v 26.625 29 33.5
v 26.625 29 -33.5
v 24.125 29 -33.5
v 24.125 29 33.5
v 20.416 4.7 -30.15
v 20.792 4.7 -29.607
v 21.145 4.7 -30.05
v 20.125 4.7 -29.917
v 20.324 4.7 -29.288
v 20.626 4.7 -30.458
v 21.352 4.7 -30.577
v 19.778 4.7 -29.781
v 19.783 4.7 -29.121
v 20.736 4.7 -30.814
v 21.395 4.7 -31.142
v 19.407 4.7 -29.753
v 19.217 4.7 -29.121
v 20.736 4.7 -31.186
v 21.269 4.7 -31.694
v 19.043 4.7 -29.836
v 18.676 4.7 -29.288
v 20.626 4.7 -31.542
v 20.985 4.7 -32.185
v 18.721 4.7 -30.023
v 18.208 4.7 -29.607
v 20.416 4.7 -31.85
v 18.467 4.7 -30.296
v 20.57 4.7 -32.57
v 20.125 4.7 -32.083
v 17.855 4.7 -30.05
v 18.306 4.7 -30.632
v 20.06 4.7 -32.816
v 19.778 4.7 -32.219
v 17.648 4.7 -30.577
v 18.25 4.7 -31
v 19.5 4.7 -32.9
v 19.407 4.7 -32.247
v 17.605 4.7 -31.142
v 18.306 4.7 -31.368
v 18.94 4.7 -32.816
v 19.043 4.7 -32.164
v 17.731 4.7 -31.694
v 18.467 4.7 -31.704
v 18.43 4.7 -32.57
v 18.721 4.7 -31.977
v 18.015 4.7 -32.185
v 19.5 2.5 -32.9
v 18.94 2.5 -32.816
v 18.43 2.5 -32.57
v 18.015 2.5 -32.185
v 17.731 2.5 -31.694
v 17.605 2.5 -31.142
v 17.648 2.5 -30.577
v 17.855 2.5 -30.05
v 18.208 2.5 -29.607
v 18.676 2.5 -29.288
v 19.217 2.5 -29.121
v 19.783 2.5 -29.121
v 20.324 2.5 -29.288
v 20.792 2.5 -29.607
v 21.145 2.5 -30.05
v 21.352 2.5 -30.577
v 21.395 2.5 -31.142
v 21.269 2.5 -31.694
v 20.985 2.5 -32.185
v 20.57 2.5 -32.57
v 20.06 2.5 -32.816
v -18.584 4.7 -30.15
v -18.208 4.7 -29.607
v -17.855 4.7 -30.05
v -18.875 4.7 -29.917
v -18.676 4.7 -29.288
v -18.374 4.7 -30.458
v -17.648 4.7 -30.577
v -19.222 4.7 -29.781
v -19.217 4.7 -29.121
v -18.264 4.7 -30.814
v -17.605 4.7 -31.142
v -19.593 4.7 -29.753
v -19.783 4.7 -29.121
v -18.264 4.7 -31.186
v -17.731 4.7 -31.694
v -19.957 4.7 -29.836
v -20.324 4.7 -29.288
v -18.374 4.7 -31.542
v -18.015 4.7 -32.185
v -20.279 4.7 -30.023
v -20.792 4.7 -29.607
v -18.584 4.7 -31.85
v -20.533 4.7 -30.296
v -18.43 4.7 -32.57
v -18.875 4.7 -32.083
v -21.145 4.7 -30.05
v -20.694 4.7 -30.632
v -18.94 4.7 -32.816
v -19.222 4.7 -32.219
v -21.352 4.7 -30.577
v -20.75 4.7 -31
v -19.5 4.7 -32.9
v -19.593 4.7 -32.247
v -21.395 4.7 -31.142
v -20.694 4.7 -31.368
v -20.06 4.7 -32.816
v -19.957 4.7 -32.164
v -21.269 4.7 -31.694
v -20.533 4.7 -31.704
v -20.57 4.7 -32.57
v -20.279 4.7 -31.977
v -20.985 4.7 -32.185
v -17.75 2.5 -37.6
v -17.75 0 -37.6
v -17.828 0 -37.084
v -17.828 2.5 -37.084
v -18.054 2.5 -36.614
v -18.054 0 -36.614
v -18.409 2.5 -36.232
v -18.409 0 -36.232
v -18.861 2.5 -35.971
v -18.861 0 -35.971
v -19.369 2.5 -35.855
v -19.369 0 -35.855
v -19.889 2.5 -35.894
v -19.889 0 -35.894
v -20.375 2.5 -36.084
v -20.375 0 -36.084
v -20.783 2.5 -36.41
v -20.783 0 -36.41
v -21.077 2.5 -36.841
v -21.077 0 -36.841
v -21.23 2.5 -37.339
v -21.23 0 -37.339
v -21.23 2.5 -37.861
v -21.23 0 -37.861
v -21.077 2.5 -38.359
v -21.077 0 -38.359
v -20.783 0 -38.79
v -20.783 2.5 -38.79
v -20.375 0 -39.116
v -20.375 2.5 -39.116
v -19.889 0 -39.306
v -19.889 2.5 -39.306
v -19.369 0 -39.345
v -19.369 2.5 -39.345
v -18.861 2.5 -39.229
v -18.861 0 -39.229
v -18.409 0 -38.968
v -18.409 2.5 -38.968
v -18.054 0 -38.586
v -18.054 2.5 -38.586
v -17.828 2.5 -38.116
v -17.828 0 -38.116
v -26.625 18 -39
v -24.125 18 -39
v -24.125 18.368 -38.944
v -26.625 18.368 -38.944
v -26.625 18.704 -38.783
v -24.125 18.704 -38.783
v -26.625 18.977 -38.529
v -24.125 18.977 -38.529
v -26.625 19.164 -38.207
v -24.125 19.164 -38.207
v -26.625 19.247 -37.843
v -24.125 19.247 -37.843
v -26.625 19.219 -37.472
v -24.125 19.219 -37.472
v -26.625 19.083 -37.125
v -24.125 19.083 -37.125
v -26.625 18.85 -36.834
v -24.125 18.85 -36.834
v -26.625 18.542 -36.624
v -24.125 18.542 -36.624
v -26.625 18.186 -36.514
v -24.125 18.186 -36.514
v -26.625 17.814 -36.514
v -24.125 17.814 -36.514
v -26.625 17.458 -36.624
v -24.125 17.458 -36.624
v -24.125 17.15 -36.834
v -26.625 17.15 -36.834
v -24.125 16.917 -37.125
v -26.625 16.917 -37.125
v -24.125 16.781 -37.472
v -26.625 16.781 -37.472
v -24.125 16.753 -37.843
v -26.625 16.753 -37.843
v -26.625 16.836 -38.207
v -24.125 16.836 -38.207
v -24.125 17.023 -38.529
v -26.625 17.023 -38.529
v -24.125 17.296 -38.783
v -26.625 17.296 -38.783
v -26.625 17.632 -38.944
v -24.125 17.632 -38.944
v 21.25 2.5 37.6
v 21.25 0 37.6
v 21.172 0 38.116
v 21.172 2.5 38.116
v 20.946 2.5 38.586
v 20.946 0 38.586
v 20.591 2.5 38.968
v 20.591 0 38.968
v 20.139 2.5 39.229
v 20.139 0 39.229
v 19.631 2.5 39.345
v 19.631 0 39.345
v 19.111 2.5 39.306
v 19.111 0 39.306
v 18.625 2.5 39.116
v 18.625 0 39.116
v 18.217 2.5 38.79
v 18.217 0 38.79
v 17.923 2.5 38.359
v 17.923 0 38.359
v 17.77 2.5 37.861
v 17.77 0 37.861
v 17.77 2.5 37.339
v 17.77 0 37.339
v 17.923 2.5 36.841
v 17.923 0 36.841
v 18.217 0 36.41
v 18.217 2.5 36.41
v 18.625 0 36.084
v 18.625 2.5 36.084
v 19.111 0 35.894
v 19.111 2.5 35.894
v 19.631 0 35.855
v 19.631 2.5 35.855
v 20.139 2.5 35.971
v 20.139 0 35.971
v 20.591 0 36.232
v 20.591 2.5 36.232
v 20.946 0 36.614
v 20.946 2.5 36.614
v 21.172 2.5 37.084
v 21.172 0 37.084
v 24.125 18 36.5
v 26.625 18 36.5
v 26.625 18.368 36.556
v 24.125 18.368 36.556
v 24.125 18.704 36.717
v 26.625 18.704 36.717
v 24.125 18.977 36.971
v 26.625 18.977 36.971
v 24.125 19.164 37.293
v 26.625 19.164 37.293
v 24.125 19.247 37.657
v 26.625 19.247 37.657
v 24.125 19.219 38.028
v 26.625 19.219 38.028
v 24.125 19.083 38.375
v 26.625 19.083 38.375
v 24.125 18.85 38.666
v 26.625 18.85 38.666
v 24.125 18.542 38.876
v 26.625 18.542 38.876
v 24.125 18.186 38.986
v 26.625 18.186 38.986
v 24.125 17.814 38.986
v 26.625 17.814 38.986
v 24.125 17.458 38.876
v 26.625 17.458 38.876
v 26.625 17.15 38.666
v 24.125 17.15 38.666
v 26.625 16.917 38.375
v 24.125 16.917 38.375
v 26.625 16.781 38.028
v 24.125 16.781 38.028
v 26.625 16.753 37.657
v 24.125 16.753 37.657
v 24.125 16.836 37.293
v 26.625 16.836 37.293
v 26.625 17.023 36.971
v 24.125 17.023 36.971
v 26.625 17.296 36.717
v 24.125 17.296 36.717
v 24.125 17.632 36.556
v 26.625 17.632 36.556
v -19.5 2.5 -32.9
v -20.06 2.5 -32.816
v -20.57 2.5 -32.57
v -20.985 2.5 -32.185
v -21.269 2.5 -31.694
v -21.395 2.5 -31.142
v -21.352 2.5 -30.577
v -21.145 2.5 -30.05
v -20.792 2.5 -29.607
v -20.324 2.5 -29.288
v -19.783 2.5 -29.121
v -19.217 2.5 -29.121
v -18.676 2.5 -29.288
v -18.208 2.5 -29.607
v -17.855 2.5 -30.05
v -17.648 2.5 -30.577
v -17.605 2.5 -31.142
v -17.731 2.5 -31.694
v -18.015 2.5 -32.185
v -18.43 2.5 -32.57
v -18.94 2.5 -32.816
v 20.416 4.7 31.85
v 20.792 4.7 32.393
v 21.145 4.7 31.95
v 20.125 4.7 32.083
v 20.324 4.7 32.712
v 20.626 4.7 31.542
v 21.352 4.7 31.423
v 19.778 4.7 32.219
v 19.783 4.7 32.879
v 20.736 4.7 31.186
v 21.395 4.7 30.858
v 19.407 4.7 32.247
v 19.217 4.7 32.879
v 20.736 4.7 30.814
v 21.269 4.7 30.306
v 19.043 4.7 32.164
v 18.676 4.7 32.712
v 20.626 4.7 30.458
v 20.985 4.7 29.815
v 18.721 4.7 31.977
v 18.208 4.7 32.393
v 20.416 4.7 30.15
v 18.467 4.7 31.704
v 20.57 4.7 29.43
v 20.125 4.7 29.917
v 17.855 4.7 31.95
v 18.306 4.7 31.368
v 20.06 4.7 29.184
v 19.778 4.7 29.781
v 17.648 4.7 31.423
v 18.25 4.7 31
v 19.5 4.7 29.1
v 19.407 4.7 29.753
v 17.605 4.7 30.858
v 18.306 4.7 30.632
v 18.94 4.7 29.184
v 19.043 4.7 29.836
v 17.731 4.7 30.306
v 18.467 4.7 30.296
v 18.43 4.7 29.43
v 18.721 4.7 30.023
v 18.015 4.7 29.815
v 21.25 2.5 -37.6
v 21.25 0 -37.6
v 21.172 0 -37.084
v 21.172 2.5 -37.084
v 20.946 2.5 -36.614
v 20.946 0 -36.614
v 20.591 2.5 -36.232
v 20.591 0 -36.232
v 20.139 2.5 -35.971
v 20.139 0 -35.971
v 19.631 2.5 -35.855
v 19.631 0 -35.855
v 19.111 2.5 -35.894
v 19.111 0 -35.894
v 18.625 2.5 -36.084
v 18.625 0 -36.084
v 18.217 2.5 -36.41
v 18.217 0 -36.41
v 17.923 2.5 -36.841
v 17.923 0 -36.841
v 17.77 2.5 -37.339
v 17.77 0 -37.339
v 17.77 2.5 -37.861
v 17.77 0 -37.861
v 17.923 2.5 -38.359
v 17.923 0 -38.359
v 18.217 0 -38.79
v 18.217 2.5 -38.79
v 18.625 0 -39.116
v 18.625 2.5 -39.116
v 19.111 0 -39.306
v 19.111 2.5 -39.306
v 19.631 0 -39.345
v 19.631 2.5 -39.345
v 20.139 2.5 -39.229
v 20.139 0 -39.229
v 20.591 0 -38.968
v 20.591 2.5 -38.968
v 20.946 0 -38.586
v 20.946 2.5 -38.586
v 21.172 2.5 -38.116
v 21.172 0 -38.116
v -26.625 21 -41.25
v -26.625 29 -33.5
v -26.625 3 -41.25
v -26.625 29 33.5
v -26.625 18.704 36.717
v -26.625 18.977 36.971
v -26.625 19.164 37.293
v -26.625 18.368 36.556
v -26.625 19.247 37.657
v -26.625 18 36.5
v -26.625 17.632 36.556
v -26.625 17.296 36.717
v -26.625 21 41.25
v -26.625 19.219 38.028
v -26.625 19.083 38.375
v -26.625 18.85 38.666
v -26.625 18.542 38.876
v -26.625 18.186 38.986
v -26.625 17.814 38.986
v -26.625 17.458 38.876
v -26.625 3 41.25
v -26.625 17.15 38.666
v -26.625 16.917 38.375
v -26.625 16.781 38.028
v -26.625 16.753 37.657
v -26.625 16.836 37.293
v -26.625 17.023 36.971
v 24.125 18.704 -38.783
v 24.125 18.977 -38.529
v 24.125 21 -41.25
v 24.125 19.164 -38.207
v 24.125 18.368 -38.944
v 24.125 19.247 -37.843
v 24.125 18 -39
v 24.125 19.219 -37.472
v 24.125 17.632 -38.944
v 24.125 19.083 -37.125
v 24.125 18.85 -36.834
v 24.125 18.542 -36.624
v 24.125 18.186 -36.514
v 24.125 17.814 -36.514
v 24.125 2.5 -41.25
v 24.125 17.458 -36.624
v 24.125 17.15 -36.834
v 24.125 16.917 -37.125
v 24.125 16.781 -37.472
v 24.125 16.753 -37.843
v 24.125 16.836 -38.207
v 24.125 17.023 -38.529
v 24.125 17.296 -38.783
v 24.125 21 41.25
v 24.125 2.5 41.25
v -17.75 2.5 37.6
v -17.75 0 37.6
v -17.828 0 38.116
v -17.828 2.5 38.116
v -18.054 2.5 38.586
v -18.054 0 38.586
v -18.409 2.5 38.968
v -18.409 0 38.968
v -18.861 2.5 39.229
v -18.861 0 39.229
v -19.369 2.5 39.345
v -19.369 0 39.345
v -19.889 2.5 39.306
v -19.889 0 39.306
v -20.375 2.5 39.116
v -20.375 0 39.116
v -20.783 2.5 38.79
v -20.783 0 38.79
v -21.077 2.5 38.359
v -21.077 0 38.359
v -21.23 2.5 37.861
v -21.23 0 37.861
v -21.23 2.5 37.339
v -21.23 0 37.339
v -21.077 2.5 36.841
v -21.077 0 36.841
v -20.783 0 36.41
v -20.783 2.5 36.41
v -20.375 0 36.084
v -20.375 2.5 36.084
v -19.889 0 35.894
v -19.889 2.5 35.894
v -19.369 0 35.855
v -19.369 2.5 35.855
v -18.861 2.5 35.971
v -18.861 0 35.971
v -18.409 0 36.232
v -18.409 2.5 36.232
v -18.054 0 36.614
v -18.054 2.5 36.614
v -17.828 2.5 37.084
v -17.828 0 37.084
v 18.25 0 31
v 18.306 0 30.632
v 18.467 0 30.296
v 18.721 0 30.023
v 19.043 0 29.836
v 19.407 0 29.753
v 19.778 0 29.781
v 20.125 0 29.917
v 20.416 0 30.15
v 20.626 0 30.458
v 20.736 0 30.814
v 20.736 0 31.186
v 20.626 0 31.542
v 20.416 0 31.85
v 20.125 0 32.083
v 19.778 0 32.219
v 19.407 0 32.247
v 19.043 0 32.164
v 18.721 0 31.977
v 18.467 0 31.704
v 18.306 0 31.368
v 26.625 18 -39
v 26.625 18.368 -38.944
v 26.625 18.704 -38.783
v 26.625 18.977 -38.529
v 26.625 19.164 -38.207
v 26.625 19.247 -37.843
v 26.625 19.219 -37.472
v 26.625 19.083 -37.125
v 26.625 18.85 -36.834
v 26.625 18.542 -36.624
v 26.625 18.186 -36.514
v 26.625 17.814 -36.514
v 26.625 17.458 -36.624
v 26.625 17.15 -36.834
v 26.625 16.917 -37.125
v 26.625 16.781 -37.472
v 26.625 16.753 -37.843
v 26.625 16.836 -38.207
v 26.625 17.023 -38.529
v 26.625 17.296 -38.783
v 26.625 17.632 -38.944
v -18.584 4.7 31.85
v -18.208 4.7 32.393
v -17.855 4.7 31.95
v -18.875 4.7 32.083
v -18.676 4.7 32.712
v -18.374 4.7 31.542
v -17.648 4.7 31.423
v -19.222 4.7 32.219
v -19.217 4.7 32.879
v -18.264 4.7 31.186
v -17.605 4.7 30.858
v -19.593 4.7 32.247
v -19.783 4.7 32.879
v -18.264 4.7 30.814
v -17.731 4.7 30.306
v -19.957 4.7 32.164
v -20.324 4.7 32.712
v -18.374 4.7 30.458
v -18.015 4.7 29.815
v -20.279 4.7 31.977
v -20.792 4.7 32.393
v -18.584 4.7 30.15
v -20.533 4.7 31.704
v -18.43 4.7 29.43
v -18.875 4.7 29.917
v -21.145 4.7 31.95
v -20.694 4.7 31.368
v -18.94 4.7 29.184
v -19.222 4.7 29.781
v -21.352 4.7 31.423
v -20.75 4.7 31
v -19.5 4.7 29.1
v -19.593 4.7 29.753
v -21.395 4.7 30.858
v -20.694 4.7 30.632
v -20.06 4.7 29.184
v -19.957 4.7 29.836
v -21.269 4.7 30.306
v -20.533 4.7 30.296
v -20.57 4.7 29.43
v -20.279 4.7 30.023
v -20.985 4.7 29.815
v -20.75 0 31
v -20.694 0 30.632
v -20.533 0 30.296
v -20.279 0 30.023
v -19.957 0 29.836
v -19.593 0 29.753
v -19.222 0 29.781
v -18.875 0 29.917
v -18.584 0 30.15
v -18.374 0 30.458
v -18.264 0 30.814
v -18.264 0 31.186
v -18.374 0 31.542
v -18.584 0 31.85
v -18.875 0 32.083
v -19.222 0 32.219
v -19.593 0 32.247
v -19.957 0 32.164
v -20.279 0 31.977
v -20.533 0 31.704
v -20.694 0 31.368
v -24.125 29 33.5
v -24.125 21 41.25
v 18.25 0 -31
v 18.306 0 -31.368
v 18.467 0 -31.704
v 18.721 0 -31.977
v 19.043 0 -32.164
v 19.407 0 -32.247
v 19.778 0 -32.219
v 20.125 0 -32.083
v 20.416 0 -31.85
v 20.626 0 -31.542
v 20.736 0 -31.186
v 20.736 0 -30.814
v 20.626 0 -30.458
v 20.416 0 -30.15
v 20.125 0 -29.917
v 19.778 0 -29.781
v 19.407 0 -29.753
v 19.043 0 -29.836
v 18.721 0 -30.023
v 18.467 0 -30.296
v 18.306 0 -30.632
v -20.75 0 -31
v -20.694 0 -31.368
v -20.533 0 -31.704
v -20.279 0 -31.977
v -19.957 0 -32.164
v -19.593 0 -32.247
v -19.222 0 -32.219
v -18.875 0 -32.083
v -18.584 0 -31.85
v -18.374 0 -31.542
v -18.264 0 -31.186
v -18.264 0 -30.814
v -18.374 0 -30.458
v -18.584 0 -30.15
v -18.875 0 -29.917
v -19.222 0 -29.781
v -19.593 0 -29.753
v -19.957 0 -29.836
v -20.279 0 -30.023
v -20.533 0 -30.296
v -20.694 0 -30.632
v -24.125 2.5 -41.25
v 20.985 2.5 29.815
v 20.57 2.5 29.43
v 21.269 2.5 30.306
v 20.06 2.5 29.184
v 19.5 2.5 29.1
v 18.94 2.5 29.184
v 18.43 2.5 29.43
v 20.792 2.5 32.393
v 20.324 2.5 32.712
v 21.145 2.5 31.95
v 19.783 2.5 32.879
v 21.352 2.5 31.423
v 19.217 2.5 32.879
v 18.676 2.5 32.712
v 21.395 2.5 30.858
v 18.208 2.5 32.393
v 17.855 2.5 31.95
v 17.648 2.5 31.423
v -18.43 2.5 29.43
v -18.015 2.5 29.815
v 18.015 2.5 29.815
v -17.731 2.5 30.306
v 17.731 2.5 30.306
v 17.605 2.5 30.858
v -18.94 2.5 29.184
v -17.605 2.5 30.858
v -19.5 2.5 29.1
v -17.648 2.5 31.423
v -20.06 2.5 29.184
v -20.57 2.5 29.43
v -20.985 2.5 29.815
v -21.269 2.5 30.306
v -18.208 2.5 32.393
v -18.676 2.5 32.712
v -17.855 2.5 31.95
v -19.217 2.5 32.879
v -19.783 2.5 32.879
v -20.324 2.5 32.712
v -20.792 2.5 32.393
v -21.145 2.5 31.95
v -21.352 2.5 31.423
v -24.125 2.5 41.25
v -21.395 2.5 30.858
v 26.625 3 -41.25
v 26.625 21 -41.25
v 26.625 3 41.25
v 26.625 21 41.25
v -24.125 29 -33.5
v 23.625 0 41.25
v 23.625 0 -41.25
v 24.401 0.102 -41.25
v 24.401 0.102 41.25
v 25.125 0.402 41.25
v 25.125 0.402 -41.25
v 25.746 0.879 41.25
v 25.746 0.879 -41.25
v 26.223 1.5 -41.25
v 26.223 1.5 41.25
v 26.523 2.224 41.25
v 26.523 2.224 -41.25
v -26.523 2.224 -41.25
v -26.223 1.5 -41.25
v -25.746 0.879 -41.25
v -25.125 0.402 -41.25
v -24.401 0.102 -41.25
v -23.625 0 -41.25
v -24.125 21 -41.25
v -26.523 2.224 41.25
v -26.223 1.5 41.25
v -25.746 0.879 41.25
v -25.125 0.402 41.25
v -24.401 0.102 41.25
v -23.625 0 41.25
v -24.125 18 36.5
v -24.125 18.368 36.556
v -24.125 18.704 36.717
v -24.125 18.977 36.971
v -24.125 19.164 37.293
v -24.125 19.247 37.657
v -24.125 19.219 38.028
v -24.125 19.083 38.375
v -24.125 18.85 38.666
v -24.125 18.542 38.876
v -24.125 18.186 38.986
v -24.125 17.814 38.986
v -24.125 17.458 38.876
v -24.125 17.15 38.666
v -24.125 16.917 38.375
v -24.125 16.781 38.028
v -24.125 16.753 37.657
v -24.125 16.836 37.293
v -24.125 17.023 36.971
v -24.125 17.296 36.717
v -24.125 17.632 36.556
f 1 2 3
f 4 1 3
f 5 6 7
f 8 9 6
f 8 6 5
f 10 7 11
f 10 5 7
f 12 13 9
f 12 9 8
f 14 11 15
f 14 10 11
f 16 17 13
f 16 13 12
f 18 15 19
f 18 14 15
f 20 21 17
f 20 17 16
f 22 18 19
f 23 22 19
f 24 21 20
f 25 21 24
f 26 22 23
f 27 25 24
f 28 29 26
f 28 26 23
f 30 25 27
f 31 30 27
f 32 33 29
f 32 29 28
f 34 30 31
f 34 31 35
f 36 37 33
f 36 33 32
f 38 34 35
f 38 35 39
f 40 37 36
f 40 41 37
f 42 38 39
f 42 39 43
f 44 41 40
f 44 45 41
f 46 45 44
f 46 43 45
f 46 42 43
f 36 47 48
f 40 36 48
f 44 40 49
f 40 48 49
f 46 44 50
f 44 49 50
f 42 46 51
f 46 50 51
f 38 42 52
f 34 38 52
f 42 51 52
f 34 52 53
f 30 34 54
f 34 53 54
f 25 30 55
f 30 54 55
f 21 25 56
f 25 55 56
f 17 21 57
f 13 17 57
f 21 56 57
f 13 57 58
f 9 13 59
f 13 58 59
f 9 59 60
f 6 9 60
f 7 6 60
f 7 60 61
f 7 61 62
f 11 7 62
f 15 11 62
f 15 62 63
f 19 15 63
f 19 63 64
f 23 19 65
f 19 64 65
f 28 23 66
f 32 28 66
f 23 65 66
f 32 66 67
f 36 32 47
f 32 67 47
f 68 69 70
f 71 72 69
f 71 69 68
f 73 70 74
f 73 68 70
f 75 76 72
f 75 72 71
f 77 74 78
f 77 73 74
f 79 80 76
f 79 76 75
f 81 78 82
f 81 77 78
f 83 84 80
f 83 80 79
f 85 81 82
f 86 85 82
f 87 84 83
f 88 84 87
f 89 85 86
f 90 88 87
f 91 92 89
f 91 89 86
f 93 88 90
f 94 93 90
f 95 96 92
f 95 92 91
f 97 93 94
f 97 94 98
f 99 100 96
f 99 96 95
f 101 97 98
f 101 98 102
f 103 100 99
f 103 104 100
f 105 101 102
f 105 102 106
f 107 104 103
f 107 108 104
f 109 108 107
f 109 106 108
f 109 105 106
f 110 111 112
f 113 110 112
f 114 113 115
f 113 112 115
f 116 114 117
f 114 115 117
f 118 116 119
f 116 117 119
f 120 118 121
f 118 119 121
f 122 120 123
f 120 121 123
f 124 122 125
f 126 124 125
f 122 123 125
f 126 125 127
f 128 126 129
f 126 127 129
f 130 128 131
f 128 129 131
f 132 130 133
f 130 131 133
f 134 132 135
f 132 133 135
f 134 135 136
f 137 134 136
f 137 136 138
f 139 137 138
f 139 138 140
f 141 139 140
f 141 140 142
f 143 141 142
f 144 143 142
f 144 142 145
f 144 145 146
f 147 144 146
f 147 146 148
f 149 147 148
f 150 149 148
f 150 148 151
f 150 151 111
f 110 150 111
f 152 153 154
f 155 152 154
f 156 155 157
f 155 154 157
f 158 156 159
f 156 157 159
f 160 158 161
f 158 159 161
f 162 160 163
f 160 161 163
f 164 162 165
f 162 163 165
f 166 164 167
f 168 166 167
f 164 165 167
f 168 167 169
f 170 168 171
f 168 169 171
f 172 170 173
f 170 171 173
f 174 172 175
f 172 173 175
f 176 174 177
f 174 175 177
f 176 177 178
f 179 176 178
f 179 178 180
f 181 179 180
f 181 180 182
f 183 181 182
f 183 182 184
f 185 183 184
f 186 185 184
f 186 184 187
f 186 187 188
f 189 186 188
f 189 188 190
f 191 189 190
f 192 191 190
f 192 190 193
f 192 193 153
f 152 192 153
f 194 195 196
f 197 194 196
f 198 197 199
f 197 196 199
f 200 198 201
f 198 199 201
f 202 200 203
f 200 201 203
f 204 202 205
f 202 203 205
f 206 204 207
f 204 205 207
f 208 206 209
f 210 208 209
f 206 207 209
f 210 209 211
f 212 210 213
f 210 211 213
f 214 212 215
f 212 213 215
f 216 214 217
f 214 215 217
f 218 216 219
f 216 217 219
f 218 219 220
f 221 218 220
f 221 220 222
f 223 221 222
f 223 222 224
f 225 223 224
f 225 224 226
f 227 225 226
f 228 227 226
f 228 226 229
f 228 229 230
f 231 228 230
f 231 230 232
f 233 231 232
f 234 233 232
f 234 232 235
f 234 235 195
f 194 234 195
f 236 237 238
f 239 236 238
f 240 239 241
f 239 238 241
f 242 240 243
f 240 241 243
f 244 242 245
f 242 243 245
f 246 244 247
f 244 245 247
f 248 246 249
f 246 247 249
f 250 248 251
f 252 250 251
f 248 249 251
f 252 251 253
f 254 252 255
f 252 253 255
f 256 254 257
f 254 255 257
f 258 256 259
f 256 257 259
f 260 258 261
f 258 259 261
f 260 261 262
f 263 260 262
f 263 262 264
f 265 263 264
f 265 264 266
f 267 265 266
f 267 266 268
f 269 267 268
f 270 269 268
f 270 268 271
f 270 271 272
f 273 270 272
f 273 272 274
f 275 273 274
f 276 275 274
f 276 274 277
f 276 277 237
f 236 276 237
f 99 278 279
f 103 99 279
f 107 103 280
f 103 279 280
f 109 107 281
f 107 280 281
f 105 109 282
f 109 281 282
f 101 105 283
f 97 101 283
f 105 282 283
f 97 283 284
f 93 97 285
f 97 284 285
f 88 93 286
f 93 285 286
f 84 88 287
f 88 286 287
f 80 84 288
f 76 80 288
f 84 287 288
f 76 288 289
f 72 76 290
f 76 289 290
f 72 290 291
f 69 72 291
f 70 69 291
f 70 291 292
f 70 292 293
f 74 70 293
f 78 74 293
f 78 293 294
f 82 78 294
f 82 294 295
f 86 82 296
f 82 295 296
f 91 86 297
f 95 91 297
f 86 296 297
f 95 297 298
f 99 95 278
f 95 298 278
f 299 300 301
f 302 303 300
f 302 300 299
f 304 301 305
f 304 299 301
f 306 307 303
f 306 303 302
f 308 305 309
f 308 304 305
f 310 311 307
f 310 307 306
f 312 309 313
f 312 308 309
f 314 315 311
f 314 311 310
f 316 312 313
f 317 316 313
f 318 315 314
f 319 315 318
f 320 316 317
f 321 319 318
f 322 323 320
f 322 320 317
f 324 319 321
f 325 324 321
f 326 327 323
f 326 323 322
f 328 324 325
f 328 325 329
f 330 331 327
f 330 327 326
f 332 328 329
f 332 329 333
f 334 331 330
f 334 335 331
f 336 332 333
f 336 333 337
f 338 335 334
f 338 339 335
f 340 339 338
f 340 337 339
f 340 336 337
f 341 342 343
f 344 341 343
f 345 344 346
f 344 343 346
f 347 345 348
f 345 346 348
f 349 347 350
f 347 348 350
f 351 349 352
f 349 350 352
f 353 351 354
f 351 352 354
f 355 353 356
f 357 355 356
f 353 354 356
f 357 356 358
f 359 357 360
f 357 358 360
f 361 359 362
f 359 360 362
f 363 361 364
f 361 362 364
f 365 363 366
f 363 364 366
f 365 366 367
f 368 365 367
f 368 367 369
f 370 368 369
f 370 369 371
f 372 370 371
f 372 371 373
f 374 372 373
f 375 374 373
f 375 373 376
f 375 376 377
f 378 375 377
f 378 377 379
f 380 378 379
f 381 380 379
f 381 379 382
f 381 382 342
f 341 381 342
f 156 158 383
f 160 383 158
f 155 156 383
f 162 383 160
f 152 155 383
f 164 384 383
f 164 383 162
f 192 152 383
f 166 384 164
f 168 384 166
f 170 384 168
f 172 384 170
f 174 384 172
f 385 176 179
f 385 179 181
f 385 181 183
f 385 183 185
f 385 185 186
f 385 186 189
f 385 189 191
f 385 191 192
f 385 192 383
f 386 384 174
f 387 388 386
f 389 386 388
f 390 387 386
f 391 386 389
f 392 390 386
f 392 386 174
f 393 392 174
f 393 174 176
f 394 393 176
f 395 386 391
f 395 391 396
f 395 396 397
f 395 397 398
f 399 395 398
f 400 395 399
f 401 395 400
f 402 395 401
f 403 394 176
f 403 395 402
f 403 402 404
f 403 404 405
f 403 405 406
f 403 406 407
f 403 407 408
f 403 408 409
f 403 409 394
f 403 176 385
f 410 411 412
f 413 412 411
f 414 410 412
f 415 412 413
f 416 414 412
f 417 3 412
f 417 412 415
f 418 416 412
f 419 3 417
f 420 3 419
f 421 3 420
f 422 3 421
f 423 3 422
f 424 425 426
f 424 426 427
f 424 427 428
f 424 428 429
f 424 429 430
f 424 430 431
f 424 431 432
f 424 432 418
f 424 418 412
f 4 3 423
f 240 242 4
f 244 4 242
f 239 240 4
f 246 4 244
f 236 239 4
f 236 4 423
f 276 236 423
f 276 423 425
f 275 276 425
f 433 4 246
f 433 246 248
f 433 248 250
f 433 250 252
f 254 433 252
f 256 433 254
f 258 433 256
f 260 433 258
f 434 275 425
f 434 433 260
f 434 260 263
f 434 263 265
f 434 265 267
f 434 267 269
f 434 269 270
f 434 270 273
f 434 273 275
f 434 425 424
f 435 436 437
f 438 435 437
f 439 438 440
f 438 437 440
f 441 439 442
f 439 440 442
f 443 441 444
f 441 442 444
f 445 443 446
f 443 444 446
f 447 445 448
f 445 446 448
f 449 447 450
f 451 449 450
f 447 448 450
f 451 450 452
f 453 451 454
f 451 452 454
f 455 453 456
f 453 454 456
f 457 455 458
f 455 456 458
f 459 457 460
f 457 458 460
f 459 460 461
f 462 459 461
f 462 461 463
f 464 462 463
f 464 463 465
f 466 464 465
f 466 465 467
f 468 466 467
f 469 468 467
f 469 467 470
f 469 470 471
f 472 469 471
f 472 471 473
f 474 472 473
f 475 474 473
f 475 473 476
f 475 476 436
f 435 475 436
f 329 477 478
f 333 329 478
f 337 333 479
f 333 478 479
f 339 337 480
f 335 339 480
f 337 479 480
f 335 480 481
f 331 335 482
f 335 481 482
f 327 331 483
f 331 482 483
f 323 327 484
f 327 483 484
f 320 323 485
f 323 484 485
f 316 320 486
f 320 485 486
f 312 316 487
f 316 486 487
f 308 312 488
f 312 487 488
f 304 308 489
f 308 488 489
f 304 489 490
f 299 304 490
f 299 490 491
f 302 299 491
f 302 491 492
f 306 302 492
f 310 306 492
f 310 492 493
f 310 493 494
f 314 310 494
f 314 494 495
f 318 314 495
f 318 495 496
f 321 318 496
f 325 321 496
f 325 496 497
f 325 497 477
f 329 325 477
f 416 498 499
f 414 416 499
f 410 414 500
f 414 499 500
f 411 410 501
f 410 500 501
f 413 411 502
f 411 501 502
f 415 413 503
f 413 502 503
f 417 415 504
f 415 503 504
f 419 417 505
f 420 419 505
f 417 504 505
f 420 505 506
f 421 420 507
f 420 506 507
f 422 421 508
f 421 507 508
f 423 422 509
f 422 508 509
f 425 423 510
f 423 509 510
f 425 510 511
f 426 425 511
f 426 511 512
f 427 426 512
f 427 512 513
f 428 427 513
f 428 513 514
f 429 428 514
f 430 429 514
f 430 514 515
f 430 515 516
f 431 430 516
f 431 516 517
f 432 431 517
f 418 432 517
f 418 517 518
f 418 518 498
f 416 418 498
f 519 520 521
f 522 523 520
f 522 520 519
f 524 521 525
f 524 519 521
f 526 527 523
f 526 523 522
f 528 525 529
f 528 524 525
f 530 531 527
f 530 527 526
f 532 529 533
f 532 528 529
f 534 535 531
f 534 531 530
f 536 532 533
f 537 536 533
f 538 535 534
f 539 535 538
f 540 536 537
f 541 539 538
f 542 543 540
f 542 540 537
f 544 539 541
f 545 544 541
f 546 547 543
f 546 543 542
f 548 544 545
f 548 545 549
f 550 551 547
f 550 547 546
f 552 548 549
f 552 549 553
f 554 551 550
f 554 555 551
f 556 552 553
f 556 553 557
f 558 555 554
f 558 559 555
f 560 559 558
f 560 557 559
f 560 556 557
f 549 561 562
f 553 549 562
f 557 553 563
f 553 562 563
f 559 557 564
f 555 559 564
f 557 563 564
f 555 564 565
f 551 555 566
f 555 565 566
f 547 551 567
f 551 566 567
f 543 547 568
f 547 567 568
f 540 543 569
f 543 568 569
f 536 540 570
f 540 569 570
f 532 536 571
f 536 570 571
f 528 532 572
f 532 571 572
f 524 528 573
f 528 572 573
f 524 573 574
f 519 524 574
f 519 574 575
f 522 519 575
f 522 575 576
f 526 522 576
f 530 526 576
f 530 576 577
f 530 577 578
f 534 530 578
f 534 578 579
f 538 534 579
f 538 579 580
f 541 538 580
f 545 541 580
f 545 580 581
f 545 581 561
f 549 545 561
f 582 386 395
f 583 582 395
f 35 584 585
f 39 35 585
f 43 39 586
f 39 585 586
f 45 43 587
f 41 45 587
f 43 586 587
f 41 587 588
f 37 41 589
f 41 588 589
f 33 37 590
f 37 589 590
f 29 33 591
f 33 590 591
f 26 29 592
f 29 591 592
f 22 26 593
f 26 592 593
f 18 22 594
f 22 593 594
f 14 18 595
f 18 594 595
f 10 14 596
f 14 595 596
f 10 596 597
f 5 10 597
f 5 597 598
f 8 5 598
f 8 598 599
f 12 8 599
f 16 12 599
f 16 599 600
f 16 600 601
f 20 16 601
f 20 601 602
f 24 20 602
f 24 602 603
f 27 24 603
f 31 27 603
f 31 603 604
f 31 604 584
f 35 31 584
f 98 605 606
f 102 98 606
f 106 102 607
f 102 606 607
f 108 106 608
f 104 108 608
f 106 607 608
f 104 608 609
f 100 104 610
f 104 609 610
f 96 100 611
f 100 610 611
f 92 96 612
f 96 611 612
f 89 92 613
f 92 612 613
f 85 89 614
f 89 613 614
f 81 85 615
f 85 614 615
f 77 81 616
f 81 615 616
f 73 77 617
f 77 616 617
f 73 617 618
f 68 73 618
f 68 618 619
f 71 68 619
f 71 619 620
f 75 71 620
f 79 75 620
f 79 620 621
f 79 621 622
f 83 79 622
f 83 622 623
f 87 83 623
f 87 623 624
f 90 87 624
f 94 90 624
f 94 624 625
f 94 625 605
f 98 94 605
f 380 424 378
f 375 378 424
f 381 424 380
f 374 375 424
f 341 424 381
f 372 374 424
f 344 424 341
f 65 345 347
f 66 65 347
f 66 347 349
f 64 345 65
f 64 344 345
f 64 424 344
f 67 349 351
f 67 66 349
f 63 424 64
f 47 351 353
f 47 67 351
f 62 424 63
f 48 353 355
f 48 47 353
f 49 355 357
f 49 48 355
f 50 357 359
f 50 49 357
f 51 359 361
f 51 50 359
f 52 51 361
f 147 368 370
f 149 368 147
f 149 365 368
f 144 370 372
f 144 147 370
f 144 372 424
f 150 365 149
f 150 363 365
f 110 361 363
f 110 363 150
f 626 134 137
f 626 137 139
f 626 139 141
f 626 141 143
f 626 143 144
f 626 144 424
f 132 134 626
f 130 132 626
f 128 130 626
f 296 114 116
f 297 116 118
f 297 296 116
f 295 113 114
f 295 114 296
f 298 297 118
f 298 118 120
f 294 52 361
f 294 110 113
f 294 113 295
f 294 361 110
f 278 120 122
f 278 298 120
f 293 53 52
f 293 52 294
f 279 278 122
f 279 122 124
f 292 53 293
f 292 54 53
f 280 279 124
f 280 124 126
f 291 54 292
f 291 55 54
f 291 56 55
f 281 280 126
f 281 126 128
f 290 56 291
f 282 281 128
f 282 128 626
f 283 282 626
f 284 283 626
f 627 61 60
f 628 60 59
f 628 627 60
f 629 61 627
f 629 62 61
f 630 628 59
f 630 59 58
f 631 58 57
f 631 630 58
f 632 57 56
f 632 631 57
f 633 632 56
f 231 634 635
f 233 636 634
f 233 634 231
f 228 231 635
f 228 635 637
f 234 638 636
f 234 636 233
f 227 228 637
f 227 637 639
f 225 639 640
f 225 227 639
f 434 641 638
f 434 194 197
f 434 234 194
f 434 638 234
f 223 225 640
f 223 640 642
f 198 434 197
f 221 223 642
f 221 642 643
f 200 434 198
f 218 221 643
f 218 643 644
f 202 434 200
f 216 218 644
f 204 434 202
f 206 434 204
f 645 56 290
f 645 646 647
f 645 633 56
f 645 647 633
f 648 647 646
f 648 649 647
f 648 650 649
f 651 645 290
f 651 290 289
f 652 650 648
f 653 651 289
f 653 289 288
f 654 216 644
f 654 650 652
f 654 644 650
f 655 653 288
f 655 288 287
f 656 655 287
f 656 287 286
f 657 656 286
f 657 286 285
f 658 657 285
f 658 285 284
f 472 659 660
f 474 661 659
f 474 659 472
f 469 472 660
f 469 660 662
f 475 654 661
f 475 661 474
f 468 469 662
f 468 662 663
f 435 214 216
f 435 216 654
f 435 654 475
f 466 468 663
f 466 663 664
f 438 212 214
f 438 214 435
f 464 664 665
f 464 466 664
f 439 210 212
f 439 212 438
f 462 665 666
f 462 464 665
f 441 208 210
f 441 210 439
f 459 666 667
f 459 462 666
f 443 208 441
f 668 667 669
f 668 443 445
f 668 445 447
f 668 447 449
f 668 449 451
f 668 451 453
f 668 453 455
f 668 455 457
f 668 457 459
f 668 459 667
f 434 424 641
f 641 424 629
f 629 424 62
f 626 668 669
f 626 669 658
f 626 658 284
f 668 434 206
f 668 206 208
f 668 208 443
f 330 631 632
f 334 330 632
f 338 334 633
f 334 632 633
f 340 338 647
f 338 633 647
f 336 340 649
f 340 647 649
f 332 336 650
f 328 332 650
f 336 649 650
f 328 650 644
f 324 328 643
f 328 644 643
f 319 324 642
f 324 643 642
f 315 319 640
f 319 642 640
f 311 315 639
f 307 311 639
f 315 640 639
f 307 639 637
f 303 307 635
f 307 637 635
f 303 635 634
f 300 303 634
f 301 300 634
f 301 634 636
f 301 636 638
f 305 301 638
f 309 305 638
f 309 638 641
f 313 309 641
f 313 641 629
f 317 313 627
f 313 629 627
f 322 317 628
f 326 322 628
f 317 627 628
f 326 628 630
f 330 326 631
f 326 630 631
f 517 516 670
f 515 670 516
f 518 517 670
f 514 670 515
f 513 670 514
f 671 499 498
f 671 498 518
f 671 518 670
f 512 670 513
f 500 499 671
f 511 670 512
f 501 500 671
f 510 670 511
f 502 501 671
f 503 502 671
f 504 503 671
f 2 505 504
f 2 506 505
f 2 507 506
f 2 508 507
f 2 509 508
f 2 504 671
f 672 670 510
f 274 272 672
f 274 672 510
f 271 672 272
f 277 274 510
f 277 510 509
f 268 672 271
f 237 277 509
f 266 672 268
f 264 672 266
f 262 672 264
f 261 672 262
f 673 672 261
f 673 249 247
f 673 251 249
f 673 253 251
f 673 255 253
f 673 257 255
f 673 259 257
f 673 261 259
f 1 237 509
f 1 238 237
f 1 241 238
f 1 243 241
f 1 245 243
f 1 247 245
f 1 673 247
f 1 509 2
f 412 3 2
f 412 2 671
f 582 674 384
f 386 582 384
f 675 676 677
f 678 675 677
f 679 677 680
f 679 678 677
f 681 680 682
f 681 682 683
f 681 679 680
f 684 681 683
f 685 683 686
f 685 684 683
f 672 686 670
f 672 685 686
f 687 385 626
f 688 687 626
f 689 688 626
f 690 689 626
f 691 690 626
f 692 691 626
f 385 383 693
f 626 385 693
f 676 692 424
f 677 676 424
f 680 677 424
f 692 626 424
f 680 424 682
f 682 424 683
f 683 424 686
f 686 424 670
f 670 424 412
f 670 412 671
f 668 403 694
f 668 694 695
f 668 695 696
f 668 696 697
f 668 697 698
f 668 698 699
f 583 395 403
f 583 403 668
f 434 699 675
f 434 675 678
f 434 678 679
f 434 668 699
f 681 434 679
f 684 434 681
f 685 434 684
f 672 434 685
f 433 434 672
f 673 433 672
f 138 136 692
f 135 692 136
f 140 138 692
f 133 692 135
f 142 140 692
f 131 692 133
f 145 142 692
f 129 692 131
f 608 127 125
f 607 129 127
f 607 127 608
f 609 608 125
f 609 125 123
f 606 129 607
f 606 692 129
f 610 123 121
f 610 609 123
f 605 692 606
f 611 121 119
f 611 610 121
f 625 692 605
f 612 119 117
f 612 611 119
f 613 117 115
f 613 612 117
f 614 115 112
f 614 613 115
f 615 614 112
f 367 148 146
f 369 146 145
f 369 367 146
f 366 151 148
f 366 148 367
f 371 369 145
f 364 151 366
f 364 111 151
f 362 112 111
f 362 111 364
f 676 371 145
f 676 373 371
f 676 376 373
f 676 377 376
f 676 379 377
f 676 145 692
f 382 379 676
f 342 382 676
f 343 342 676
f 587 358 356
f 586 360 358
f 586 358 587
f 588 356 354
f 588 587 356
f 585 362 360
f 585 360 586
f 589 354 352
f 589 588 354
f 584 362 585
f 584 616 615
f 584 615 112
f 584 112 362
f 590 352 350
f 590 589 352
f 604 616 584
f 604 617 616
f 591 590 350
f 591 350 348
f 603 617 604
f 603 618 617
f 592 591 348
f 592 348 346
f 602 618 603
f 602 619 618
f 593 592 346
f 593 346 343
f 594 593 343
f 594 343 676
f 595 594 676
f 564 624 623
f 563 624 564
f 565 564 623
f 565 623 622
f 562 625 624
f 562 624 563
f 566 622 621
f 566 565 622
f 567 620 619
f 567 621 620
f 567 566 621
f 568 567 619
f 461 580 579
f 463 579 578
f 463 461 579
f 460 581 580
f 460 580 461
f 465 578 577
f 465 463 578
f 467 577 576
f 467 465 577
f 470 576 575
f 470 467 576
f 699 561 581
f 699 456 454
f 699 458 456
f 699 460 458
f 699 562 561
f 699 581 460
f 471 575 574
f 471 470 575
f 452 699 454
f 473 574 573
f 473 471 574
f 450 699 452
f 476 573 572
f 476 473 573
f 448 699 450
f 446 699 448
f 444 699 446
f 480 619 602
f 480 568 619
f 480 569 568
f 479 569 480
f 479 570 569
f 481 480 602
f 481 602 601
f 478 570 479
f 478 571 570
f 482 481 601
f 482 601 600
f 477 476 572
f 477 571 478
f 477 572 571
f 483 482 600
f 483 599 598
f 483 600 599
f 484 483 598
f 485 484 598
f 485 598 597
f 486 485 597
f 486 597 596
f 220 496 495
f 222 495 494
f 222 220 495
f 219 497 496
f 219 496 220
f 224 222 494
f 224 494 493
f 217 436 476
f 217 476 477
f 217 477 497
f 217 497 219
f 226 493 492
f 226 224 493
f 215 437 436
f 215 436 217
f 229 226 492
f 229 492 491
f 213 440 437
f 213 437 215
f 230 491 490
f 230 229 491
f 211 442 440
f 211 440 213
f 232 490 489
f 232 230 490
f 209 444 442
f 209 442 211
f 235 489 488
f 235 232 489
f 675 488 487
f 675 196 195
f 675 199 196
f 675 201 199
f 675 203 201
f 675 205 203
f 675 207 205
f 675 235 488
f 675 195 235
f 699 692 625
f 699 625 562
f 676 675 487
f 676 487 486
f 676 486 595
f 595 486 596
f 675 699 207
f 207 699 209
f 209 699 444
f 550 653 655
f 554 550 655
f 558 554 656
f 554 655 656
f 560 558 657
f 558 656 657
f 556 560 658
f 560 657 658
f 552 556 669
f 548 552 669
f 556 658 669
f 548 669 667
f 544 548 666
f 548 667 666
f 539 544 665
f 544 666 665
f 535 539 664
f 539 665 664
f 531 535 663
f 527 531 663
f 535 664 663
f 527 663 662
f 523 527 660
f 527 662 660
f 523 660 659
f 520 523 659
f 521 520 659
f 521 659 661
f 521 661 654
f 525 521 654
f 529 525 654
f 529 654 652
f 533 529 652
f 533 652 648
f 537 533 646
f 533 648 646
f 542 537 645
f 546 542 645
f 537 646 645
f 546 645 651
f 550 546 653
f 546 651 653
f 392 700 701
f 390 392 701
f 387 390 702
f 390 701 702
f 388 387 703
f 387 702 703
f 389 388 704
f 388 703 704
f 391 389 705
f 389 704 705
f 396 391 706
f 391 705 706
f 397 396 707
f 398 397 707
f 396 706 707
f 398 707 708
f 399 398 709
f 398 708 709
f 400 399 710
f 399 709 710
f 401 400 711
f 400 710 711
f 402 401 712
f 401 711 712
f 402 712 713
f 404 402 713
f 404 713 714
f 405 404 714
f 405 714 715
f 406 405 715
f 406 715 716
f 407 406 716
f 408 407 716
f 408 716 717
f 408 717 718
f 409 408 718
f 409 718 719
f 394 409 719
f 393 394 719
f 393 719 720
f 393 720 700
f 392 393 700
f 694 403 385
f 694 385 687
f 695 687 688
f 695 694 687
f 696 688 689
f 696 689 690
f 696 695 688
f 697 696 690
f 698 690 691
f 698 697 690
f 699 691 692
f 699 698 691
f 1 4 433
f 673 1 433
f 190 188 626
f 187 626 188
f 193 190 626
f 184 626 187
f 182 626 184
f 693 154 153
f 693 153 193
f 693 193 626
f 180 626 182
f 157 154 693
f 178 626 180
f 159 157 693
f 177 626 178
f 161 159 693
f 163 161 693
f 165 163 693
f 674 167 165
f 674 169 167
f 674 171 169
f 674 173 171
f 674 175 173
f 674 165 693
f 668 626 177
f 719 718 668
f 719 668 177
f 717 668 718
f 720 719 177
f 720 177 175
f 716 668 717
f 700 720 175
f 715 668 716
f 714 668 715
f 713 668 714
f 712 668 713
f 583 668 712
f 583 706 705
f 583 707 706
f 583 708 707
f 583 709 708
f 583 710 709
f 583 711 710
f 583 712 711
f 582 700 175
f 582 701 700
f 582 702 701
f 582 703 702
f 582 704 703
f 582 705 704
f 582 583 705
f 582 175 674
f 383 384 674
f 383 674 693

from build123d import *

# Parameters (mm, degrees)
EXTRUDE_1_DEPTH          = 41.25
CUT_EXTRUDE_1_DEPTH      = 58.02151458
CUT_EXTRUDE_1_DEPTH_BACK = 58.02151458
SKETCH_4_R               = 1.75
CUT_EXTRUDE_2_DEPTH      = 10
HOLE_WIZARD_M31_REACH    = 75.336
HOLE_WIZARD_M31_BORE_R   = 1.25
HOLE_WIZARD_M32_D        = 2.5
SKETCH_10_R              = 1.9
EXTRUDE_2_DEPTH          = 2.2
HOLE_WIZARD_M33_D        = 2.5


with BuildPart() as part:
    # Эскиз1 → Бобышка-Вытянуть1 (new, symmetric)
    with BuildSketch(Plane.XY):
        with BuildLine():
            Line((-26.625, 29), (-26.625, 3))
            ThreePointArc((-26.625, 3), (-25.746320344, 0.878679656), (-23.625, 0))
            Line((-23.625, 0), (23.625, 0))
            ThreePointArc((23.625, 0), (25.746320344, 0.878679656), (26.625, 3))
            Line((26.625, 3), (26.625, 29))
            Line((26.625, 29), (24.125, 29))
            Line((24.125, 29), (24.125, 2.5))
            Line((24.125, 2.5), (-24.125, 2.5))
            Line((-24.125, 2.5), (-24.125, 29))
            Line((-24.125, 29), (-26.625, 29))
        make_face()
    extrude(amount=EXTRUDE_1_DEPTH, both=True)

    # Эскиз3 → Вырез-Вытянуть1 (cut, two sides: drawn at the far end of the back side and taken through both)
    with BuildSketch(Plane(origin=(0, 0, 0), x_dir=(0, 0, -1), z_dir=(1, 0, 0)).offset(-CUT_EXTRUDE_1_DEPTH_BACK)):
        Polygon((41.25, 21), (41.25, 29), (33.5, 29), align=None)
        Polygon((-41.25, 21), (-41.25, 29), (-33.5, 29), align=None)
    extrude(amount=CUT_EXTRUDE_1_DEPTH + CUT_EXTRUDE_1_DEPTH_BACK, mode=Mode.SUBTRACT)

    # Эскиз4 → Вырез-Вытянуть2 (cut)
    with BuildSketch(Plane.XZ):
        with Locations((-19.5, -37.6)):
            Circle(SKETCH_4_R)
        with Locations((-19.5, 37.6)):
            Circle(SKETCH_4_R)
        with Locations((19.5, 37.6)):
            Circle(SKETCH_4_R)
        with Locations((19.5, -37.6)):
            Circle(SKETCH_4_R)
    extrude(amount=-CUT_EXTRUDE_2_DEPTH, mode=Mode.SUBTRACT)

    # Отверстие обработанное метчиком M31 bore → Отверстие обработанное метчиком M31 (cut, up to next)
    with BuildSketch(Plane(origin=(26.625, 0, 0), x_dir=(0, 0, -1), z_dir=(1, 0, 0)), mode=Mode.PRIVATE) as hole_wizard_m31_sk1:
        with Locations((37.75, 18)):
            Circle(HOLE_WIZARD_M31_BORE_R)
    hole_wizard_m31_tool1 = extrude(hole_wizard_m31_sk1.sketch, amount=-HOLE_WIZARD_M31_REACH, mode=Mode.PRIVATE) & part.part
    # Отверстие обработанное метчиком M31 bore → Отверстие обработанное метчиком M31 (cut, up to next)
    with BuildSketch(Plane(origin=(26.625, 0, 0), x_dir=(0, 0, -1), z_dir=(1, 0, 0)), mode=Mode.PRIVATE) as hole_wizard_m31_sk2:
        with Locations((-37.75, 18)):
            Circle(HOLE_WIZARD_M31_BORE_R)
    hole_wizard_m31_tool2 = extrude(hole_wizard_m31_sk2.sketch, amount=-HOLE_WIZARD_M31_REACH, mode=Mode.PRIVATE) & part.part
    add(hole_wizard_m31_tool1.solids().sort_by_distance((26.625, 18, -37.75))[0], mode=Mode.SUBTRACT)
    add(hole_wizard_m31_tool2.solids().sort_by_distance((26.625, 18, 37.75))[0], mode=Mode.SUBTRACT)

    # Отверстие обработанное метчиком M32 (through all)
    with Locations(Plane.ZY.offset(26.625)):
        with Locations((-37.75, 18), (37.75, 18)):
            Hole(HOLE_WIZARD_M32_D / 2)

    # Эскиз10 → Бобышка-Вытянуть2 (add)
    with BuildSketch(Plane(origin=(0, 2.5, 0), x_dir=(1, 0, 0), z_dir=(0, 1, 0))):
        with Locations(Location((19.5, 31, 0), (0, 0, 90))):
            Circle(SKETCH_10_R)
        with Locations(Location((19.5, -31, 0), (0, 0, 90))):
            Circle(SKETCH_10_R)
        with Locations(Location((-19.5, -31, 0), (0, 0, 90))):
            Circle(SKETCH_10_R)
        with Locations(Location((-19.5, 31, 0), (0, 0, 90))):
            Circle(SKETCH_10_R)
    extrude(amount=EXTRUDE_2_DEPTH)

    # Отверстие обработанное метчиком M33 (through all)
    with Locations(Plane(origin=(0, 4.7, 0), x_dir=(1, 0, 0), z_dir=(0, 1, 0))):
        with Locations((19.5, 31), (-19.5, 31), (19.5, -31), (-19.5, -31)):
            Hole(HOLE_WIZARD_M33_D / 2)


solid = part.part
